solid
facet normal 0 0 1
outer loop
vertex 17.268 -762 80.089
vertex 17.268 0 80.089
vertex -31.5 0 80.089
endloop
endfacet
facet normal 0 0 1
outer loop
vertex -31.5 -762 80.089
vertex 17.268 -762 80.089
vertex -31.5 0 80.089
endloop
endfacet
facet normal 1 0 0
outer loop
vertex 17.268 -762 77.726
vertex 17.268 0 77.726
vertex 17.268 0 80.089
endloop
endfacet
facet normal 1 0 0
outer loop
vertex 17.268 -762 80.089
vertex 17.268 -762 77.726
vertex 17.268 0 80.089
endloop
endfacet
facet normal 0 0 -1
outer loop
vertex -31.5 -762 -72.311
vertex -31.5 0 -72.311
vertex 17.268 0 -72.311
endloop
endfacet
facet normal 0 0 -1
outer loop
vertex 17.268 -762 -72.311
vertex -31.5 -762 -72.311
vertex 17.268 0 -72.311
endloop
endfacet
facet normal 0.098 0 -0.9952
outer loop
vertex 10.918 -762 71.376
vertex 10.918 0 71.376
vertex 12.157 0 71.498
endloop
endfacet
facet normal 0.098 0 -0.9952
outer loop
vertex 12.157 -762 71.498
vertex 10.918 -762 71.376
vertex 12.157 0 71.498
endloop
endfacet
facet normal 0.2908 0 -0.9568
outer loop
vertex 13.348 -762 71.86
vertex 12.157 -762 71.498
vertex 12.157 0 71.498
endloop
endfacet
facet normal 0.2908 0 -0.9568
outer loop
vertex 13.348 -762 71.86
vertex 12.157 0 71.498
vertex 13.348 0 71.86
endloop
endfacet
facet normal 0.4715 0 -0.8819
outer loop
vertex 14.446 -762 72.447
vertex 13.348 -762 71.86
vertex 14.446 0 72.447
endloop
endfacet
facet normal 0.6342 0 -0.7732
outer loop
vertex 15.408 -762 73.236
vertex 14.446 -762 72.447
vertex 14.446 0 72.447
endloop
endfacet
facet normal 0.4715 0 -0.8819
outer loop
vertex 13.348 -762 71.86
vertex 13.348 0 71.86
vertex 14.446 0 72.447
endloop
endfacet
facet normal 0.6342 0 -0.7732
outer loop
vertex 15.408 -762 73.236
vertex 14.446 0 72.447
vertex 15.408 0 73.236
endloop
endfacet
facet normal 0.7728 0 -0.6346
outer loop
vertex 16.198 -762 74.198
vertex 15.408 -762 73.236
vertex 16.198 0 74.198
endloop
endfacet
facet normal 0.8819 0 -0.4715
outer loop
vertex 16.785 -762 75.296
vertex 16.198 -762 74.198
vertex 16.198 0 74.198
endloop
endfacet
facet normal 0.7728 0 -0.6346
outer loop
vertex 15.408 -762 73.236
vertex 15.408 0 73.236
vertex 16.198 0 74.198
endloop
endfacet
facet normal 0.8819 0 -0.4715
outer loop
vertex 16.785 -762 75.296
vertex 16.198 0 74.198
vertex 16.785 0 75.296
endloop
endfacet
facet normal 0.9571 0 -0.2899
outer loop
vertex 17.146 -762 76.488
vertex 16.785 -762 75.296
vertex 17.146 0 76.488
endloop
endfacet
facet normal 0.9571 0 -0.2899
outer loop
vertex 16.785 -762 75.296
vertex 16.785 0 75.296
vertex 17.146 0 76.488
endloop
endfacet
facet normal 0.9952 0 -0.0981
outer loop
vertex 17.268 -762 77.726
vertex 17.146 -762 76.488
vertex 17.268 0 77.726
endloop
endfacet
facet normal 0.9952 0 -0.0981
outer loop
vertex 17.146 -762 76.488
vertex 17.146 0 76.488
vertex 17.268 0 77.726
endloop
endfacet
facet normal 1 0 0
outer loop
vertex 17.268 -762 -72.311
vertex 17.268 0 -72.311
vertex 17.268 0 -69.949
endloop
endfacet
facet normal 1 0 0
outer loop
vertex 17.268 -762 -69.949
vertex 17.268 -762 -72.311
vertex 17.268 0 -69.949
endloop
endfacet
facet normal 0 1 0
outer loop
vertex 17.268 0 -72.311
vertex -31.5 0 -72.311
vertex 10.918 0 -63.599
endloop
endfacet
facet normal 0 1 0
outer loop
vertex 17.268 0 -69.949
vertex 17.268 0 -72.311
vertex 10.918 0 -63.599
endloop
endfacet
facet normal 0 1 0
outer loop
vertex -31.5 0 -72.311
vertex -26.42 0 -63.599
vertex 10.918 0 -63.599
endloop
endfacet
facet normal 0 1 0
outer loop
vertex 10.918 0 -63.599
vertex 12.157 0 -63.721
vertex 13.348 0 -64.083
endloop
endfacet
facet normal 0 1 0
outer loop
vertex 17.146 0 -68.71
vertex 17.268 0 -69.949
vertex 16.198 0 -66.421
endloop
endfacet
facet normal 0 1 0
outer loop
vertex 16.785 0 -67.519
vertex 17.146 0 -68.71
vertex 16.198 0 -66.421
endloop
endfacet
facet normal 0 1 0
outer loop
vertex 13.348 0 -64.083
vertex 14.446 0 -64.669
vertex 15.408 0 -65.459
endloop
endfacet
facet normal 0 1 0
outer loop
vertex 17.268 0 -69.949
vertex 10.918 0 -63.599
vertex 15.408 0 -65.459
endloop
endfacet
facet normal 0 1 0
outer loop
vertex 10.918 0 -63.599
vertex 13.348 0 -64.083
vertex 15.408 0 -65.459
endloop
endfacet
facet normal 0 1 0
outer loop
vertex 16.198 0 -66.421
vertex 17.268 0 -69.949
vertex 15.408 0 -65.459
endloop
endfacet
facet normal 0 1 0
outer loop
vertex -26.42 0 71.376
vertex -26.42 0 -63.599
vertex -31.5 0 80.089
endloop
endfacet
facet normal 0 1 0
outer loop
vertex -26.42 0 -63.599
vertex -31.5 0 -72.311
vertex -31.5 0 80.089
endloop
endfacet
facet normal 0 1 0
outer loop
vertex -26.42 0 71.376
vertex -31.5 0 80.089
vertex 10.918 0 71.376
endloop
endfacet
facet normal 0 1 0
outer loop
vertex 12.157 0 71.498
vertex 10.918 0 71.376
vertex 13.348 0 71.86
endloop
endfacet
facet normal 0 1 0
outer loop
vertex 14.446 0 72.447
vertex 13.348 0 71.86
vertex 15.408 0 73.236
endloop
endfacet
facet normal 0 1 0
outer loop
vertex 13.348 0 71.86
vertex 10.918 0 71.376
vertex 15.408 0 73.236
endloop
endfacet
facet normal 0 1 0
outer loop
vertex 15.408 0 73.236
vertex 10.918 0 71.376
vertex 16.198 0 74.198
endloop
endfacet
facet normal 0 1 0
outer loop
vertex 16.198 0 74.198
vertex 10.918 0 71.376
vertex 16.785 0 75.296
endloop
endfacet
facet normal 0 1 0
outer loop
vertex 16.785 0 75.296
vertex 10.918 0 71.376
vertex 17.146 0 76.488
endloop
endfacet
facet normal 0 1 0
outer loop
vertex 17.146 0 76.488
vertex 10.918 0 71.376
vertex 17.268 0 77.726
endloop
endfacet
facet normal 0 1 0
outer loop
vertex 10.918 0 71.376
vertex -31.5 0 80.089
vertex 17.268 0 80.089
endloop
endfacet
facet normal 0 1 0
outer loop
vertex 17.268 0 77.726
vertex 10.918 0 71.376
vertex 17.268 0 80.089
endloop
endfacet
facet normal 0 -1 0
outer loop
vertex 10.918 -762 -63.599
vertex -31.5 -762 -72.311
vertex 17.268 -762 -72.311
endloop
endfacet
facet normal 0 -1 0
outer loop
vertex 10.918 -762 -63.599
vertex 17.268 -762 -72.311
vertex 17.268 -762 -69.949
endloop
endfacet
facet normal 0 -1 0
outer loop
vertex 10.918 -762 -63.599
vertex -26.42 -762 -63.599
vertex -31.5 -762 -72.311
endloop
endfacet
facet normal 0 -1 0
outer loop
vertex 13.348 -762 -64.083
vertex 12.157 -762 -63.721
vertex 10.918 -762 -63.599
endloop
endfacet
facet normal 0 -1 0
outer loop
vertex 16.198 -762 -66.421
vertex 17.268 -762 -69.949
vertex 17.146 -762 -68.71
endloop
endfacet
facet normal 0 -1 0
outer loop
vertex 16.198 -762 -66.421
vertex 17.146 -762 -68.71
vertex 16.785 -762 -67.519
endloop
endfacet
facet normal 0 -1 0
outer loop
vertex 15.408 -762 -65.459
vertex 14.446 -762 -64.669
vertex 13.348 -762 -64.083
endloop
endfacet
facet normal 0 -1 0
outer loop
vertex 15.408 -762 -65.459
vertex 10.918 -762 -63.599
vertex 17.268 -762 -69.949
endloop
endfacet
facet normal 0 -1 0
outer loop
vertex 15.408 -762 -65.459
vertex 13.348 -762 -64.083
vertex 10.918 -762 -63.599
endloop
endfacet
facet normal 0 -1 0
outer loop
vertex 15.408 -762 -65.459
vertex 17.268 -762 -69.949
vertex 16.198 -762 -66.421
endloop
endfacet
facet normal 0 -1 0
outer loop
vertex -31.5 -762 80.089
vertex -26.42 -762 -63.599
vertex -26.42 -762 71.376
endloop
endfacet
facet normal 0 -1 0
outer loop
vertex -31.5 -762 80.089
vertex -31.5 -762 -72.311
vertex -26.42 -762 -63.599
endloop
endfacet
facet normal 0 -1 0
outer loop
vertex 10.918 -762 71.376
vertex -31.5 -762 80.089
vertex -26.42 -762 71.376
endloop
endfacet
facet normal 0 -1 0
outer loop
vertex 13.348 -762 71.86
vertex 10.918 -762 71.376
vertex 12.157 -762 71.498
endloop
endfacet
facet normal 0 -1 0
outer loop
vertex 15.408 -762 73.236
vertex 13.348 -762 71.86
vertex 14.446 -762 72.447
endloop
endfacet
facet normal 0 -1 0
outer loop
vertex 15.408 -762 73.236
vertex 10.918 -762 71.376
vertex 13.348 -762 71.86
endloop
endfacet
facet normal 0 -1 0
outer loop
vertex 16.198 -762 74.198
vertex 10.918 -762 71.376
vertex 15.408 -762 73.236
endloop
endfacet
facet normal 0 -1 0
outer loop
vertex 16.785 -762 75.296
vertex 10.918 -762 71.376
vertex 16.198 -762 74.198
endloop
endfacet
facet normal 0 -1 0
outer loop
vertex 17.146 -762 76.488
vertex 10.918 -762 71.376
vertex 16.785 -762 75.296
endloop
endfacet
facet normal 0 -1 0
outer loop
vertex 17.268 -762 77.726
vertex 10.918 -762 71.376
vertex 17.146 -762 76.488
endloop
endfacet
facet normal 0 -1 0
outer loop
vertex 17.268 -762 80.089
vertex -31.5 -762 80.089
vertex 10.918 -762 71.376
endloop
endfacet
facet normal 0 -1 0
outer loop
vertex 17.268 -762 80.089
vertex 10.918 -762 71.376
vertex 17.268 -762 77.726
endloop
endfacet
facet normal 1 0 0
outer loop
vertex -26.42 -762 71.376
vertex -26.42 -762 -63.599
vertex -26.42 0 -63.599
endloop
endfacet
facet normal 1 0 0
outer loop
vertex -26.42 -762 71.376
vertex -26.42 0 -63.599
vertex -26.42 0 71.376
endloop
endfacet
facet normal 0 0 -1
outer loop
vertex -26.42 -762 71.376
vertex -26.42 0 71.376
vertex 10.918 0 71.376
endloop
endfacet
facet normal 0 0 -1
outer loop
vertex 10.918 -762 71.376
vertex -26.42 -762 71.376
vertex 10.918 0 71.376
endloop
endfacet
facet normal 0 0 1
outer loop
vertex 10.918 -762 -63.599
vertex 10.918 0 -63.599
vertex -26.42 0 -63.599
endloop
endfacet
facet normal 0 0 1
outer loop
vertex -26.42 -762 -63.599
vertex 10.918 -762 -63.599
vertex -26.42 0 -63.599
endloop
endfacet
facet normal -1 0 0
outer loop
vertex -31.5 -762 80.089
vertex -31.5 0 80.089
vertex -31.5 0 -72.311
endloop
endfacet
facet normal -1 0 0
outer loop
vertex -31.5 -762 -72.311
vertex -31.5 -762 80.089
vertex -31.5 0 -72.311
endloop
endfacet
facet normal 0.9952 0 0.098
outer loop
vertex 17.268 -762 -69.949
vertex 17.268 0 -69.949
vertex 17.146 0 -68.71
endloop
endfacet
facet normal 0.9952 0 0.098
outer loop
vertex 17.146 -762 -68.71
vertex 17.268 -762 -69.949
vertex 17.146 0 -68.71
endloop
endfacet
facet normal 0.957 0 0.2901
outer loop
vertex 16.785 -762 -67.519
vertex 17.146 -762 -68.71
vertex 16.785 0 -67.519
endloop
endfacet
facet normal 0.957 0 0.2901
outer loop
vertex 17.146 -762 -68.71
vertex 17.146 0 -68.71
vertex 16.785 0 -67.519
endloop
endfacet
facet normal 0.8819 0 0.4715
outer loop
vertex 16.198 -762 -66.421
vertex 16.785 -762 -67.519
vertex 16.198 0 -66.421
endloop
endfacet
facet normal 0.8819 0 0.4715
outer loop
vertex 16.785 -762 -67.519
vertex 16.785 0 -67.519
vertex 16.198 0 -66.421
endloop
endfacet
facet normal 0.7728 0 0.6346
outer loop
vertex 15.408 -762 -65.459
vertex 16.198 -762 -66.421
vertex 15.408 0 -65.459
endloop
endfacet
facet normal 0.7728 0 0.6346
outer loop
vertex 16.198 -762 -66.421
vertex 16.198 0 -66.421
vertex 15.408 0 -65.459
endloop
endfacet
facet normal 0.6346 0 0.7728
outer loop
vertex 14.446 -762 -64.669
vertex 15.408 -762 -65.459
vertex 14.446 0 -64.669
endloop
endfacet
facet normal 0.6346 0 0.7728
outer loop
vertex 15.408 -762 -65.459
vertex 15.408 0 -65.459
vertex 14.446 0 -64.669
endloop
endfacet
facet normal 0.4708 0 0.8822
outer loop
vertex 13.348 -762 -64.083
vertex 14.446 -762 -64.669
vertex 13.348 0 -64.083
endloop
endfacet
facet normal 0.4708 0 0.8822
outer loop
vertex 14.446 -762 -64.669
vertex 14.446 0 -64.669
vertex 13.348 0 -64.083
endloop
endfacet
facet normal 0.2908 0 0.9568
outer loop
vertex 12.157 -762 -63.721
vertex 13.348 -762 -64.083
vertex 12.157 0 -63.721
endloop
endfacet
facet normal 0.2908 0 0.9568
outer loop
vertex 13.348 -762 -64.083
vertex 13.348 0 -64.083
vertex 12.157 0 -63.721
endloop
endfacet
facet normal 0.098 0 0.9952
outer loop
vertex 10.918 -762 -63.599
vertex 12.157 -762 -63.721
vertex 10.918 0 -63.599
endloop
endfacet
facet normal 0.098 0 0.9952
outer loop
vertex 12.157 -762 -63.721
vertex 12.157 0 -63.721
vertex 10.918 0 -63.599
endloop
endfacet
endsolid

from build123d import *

# Parameters (mm, degrees)
F1_DEPTH = 762


with BuildPart() as f1:
    # F0 (on Front) → F1 (new body)
    with BuildSketch(Plane.XZ):
        with BuildLine():
            Line((-31.499875, 80.088559), (-31.499875, 72.680225))
            Line((-31.499875, 72.680225), (-31.499875, -72.311441))
            Line((-31.499875, -72.311441), (17.268125, -72.311441))
            Line((17.268125, -72.311441), (17.268125, -69.949241))
            ThreePointArc((17.268125, -69.949241), (15.408253, -65.459113), (10.918125, -63.599241))
            Line((10.918125, -63.599241), (-26.419875, -63.599241))
            Line((-26.419875, -63.599241), (-26.419875, 71.376359))
            Line((-26.419875, 71.376359), (10.918125, 71.376359))
            ThreePointArc((10.918125, 71.376359), (15.408253, 73.236231), (17.268125, 77.726359))
            Line((17.268125, 77.726359), (17.268125, 80.088559))
            Line((17.268125, 80.088559), (-31.499875, 80.088559))
        make_face()
    extrude(amount=F1_DEPTH)


solid = f1.part
